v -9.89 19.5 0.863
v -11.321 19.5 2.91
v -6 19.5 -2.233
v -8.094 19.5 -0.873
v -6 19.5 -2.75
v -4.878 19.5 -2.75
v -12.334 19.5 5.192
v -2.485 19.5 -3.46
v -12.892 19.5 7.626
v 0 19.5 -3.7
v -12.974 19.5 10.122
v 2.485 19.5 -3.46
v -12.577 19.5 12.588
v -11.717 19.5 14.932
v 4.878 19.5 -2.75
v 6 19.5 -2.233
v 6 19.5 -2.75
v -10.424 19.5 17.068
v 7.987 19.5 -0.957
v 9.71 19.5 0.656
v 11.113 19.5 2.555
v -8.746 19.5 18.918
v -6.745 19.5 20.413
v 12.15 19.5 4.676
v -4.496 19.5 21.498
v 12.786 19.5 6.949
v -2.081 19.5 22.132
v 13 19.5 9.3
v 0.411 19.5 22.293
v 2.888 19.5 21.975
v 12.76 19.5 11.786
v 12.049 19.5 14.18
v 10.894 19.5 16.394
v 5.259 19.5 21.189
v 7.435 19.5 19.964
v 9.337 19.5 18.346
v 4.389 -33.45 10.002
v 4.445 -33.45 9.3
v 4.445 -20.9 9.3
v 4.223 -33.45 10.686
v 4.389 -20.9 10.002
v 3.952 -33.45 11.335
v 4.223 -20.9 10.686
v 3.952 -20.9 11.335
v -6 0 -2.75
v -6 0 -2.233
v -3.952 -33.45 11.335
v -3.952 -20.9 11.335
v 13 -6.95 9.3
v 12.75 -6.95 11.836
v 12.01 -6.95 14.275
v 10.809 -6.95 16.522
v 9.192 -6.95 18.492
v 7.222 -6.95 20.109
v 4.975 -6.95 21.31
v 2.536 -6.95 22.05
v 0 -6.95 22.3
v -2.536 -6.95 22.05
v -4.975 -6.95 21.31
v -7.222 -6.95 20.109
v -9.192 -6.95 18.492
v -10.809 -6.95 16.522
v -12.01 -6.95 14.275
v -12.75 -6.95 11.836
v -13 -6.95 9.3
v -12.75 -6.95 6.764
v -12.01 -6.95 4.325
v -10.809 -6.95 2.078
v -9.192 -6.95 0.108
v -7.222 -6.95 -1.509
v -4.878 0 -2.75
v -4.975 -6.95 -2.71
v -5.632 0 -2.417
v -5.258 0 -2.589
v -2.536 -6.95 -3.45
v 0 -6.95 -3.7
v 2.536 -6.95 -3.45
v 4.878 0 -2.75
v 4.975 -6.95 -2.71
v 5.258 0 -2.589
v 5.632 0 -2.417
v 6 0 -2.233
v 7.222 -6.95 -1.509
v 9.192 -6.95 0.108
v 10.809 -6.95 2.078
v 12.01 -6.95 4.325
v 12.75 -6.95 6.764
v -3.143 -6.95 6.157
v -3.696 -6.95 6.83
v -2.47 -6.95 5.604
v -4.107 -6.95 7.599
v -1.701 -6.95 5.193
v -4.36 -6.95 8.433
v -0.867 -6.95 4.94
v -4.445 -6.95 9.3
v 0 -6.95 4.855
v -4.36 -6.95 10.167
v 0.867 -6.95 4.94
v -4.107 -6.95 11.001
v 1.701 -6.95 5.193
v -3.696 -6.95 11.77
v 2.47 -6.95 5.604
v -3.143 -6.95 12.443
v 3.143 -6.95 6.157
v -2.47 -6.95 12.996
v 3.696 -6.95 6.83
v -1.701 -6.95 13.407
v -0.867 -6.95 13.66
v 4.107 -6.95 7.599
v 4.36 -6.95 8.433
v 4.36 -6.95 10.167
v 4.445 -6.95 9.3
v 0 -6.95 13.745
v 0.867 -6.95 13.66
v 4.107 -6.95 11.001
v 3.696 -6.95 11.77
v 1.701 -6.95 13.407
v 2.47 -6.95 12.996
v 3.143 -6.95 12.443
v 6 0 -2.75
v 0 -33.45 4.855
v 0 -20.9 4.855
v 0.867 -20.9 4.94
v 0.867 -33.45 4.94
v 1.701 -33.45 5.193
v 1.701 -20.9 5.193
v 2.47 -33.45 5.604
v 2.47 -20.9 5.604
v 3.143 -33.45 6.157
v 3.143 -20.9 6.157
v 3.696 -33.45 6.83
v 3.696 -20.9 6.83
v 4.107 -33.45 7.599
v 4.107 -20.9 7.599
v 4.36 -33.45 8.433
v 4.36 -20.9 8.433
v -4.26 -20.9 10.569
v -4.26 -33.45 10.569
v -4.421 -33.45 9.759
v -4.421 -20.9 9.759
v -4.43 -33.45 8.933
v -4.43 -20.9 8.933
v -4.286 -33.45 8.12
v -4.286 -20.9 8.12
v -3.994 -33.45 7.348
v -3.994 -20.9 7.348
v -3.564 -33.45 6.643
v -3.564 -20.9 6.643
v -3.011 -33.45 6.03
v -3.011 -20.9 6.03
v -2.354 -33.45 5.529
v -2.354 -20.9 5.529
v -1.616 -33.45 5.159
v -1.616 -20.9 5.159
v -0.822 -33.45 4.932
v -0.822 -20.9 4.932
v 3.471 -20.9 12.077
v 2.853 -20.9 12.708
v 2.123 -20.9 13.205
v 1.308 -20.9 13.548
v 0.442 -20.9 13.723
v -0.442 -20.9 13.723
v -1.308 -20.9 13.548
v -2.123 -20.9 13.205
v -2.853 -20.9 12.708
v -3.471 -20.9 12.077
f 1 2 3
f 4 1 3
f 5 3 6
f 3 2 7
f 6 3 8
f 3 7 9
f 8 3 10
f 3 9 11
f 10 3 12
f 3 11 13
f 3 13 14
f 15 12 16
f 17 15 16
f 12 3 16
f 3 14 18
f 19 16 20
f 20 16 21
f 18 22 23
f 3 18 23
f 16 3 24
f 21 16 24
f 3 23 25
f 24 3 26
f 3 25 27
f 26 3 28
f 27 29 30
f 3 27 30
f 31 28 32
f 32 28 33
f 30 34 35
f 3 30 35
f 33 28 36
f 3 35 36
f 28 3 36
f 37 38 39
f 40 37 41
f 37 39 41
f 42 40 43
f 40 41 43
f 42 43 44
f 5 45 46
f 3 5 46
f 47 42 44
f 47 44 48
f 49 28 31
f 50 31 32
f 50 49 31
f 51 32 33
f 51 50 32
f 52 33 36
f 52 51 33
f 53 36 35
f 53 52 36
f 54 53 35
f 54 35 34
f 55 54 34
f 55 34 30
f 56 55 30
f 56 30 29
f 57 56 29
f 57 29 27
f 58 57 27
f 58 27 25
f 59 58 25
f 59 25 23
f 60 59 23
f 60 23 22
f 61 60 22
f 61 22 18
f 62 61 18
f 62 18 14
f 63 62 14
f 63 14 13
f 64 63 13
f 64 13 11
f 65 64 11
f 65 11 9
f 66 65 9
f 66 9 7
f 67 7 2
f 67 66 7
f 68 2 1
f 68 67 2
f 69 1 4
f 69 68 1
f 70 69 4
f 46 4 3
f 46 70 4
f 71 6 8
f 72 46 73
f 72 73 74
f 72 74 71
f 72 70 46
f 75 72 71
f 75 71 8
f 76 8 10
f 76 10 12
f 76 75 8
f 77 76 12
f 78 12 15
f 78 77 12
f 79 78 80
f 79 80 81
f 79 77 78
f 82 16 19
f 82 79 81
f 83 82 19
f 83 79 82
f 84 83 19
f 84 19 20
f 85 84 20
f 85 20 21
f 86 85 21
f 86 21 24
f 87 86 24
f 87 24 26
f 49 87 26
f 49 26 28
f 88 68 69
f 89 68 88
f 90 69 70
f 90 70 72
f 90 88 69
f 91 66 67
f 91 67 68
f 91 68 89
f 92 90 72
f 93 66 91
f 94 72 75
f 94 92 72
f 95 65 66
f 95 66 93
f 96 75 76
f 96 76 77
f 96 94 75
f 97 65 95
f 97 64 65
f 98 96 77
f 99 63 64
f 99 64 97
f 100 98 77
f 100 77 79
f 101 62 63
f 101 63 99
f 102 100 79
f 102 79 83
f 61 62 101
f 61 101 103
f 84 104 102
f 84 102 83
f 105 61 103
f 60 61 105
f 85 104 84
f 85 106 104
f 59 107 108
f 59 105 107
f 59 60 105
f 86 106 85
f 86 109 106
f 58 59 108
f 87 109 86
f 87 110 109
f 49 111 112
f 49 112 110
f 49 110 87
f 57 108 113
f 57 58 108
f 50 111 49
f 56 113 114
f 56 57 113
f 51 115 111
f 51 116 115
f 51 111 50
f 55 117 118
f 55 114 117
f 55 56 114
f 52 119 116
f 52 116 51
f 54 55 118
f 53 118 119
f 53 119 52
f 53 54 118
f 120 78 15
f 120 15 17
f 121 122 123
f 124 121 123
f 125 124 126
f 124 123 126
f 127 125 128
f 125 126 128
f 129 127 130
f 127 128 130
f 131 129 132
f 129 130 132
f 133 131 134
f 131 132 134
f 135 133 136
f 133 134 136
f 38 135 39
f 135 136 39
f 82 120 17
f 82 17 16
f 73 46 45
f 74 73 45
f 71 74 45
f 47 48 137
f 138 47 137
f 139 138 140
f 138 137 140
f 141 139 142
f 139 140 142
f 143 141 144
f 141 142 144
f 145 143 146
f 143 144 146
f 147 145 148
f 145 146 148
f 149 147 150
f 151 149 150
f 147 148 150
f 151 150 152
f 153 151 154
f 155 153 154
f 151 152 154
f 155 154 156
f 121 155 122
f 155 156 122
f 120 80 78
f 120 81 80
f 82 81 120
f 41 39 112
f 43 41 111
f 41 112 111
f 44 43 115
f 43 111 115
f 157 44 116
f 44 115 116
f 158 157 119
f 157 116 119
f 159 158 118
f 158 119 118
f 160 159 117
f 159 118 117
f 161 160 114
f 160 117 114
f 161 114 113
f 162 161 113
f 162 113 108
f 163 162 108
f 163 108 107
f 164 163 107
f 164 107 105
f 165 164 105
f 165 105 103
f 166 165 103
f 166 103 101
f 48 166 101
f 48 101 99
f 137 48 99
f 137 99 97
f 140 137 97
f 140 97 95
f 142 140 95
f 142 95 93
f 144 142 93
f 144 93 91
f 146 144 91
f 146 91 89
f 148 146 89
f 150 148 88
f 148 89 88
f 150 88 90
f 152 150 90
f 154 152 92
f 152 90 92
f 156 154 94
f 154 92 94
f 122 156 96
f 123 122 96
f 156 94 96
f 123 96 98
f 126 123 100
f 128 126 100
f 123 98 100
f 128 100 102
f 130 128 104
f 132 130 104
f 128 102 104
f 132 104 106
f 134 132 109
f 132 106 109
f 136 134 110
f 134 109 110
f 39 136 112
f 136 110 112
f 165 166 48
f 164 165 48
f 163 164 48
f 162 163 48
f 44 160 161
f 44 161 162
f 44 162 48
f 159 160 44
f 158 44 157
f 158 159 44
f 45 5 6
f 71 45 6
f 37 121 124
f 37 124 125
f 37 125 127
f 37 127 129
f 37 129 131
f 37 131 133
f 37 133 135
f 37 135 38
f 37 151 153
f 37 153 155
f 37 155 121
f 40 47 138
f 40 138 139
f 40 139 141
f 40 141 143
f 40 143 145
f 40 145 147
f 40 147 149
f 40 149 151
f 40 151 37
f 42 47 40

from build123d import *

# Parameters (mm, degrees)
F0_W     = 12
F0_H     = 5.5
F1_DEPTH = 19.5
F3_R     = 13
F4_DEPTH = 26.45
F5_R     = 4.445
F6_DEPTH = 13.95
F9_DEPTH = 12.55


with BuildPart() as f1:
    # F0 (on Front) → F1 (new body)
    with BuildSketch(Plane.XZ):
        Rectangle(F0_W, F0_H)
    extrude(amount=-F1_DEPTH)

    # F3 (on offset) → F4 (join, through all)
    with BuildSketch(Plane.XZ.offset(6.95)):
        with Locations((0, 9.3)):
            Circle(F3_R)
    extrude(amount=-F4_DEPTH)

    # F5 (on offset) → F6 (join)
    with BuildSketch(Plane.XZ.offset(6.95)):
        with Locations((0, 9.3)):
            Circle(F5_R)
    extrude(amount=F6_DEPTH)

    # F8 (on offset) → F9 (join)
    with BuildSketch(Plane.XZ.offset(20.9)):
        with BuildLine():
            ThreePointArc((0, 4.855), (3.1430896424, 6.1569103576), (4.445, 9.3))
            ThreePointArc((4.445, 9.3), (4.3199432386, 10.3469553071), (3.951809712, 11.335))
            Line((3.951809712, 11.335), (0, 11.335))
            Line((0, 11.335), (0, 4.855))
        make_face()
        with BuildLine():
            ThreePointArc((-3.951809712, 11.335), (-3.7949703556, 6.9856480389), (0, 4.855))
            Line((0, 4.855), (0, 11.335))
            Line((0, 11.335), (-3.951809712, 11.335))
        make_face()
    extrude(amount=F9_DEPTH)


solid = f1.part
